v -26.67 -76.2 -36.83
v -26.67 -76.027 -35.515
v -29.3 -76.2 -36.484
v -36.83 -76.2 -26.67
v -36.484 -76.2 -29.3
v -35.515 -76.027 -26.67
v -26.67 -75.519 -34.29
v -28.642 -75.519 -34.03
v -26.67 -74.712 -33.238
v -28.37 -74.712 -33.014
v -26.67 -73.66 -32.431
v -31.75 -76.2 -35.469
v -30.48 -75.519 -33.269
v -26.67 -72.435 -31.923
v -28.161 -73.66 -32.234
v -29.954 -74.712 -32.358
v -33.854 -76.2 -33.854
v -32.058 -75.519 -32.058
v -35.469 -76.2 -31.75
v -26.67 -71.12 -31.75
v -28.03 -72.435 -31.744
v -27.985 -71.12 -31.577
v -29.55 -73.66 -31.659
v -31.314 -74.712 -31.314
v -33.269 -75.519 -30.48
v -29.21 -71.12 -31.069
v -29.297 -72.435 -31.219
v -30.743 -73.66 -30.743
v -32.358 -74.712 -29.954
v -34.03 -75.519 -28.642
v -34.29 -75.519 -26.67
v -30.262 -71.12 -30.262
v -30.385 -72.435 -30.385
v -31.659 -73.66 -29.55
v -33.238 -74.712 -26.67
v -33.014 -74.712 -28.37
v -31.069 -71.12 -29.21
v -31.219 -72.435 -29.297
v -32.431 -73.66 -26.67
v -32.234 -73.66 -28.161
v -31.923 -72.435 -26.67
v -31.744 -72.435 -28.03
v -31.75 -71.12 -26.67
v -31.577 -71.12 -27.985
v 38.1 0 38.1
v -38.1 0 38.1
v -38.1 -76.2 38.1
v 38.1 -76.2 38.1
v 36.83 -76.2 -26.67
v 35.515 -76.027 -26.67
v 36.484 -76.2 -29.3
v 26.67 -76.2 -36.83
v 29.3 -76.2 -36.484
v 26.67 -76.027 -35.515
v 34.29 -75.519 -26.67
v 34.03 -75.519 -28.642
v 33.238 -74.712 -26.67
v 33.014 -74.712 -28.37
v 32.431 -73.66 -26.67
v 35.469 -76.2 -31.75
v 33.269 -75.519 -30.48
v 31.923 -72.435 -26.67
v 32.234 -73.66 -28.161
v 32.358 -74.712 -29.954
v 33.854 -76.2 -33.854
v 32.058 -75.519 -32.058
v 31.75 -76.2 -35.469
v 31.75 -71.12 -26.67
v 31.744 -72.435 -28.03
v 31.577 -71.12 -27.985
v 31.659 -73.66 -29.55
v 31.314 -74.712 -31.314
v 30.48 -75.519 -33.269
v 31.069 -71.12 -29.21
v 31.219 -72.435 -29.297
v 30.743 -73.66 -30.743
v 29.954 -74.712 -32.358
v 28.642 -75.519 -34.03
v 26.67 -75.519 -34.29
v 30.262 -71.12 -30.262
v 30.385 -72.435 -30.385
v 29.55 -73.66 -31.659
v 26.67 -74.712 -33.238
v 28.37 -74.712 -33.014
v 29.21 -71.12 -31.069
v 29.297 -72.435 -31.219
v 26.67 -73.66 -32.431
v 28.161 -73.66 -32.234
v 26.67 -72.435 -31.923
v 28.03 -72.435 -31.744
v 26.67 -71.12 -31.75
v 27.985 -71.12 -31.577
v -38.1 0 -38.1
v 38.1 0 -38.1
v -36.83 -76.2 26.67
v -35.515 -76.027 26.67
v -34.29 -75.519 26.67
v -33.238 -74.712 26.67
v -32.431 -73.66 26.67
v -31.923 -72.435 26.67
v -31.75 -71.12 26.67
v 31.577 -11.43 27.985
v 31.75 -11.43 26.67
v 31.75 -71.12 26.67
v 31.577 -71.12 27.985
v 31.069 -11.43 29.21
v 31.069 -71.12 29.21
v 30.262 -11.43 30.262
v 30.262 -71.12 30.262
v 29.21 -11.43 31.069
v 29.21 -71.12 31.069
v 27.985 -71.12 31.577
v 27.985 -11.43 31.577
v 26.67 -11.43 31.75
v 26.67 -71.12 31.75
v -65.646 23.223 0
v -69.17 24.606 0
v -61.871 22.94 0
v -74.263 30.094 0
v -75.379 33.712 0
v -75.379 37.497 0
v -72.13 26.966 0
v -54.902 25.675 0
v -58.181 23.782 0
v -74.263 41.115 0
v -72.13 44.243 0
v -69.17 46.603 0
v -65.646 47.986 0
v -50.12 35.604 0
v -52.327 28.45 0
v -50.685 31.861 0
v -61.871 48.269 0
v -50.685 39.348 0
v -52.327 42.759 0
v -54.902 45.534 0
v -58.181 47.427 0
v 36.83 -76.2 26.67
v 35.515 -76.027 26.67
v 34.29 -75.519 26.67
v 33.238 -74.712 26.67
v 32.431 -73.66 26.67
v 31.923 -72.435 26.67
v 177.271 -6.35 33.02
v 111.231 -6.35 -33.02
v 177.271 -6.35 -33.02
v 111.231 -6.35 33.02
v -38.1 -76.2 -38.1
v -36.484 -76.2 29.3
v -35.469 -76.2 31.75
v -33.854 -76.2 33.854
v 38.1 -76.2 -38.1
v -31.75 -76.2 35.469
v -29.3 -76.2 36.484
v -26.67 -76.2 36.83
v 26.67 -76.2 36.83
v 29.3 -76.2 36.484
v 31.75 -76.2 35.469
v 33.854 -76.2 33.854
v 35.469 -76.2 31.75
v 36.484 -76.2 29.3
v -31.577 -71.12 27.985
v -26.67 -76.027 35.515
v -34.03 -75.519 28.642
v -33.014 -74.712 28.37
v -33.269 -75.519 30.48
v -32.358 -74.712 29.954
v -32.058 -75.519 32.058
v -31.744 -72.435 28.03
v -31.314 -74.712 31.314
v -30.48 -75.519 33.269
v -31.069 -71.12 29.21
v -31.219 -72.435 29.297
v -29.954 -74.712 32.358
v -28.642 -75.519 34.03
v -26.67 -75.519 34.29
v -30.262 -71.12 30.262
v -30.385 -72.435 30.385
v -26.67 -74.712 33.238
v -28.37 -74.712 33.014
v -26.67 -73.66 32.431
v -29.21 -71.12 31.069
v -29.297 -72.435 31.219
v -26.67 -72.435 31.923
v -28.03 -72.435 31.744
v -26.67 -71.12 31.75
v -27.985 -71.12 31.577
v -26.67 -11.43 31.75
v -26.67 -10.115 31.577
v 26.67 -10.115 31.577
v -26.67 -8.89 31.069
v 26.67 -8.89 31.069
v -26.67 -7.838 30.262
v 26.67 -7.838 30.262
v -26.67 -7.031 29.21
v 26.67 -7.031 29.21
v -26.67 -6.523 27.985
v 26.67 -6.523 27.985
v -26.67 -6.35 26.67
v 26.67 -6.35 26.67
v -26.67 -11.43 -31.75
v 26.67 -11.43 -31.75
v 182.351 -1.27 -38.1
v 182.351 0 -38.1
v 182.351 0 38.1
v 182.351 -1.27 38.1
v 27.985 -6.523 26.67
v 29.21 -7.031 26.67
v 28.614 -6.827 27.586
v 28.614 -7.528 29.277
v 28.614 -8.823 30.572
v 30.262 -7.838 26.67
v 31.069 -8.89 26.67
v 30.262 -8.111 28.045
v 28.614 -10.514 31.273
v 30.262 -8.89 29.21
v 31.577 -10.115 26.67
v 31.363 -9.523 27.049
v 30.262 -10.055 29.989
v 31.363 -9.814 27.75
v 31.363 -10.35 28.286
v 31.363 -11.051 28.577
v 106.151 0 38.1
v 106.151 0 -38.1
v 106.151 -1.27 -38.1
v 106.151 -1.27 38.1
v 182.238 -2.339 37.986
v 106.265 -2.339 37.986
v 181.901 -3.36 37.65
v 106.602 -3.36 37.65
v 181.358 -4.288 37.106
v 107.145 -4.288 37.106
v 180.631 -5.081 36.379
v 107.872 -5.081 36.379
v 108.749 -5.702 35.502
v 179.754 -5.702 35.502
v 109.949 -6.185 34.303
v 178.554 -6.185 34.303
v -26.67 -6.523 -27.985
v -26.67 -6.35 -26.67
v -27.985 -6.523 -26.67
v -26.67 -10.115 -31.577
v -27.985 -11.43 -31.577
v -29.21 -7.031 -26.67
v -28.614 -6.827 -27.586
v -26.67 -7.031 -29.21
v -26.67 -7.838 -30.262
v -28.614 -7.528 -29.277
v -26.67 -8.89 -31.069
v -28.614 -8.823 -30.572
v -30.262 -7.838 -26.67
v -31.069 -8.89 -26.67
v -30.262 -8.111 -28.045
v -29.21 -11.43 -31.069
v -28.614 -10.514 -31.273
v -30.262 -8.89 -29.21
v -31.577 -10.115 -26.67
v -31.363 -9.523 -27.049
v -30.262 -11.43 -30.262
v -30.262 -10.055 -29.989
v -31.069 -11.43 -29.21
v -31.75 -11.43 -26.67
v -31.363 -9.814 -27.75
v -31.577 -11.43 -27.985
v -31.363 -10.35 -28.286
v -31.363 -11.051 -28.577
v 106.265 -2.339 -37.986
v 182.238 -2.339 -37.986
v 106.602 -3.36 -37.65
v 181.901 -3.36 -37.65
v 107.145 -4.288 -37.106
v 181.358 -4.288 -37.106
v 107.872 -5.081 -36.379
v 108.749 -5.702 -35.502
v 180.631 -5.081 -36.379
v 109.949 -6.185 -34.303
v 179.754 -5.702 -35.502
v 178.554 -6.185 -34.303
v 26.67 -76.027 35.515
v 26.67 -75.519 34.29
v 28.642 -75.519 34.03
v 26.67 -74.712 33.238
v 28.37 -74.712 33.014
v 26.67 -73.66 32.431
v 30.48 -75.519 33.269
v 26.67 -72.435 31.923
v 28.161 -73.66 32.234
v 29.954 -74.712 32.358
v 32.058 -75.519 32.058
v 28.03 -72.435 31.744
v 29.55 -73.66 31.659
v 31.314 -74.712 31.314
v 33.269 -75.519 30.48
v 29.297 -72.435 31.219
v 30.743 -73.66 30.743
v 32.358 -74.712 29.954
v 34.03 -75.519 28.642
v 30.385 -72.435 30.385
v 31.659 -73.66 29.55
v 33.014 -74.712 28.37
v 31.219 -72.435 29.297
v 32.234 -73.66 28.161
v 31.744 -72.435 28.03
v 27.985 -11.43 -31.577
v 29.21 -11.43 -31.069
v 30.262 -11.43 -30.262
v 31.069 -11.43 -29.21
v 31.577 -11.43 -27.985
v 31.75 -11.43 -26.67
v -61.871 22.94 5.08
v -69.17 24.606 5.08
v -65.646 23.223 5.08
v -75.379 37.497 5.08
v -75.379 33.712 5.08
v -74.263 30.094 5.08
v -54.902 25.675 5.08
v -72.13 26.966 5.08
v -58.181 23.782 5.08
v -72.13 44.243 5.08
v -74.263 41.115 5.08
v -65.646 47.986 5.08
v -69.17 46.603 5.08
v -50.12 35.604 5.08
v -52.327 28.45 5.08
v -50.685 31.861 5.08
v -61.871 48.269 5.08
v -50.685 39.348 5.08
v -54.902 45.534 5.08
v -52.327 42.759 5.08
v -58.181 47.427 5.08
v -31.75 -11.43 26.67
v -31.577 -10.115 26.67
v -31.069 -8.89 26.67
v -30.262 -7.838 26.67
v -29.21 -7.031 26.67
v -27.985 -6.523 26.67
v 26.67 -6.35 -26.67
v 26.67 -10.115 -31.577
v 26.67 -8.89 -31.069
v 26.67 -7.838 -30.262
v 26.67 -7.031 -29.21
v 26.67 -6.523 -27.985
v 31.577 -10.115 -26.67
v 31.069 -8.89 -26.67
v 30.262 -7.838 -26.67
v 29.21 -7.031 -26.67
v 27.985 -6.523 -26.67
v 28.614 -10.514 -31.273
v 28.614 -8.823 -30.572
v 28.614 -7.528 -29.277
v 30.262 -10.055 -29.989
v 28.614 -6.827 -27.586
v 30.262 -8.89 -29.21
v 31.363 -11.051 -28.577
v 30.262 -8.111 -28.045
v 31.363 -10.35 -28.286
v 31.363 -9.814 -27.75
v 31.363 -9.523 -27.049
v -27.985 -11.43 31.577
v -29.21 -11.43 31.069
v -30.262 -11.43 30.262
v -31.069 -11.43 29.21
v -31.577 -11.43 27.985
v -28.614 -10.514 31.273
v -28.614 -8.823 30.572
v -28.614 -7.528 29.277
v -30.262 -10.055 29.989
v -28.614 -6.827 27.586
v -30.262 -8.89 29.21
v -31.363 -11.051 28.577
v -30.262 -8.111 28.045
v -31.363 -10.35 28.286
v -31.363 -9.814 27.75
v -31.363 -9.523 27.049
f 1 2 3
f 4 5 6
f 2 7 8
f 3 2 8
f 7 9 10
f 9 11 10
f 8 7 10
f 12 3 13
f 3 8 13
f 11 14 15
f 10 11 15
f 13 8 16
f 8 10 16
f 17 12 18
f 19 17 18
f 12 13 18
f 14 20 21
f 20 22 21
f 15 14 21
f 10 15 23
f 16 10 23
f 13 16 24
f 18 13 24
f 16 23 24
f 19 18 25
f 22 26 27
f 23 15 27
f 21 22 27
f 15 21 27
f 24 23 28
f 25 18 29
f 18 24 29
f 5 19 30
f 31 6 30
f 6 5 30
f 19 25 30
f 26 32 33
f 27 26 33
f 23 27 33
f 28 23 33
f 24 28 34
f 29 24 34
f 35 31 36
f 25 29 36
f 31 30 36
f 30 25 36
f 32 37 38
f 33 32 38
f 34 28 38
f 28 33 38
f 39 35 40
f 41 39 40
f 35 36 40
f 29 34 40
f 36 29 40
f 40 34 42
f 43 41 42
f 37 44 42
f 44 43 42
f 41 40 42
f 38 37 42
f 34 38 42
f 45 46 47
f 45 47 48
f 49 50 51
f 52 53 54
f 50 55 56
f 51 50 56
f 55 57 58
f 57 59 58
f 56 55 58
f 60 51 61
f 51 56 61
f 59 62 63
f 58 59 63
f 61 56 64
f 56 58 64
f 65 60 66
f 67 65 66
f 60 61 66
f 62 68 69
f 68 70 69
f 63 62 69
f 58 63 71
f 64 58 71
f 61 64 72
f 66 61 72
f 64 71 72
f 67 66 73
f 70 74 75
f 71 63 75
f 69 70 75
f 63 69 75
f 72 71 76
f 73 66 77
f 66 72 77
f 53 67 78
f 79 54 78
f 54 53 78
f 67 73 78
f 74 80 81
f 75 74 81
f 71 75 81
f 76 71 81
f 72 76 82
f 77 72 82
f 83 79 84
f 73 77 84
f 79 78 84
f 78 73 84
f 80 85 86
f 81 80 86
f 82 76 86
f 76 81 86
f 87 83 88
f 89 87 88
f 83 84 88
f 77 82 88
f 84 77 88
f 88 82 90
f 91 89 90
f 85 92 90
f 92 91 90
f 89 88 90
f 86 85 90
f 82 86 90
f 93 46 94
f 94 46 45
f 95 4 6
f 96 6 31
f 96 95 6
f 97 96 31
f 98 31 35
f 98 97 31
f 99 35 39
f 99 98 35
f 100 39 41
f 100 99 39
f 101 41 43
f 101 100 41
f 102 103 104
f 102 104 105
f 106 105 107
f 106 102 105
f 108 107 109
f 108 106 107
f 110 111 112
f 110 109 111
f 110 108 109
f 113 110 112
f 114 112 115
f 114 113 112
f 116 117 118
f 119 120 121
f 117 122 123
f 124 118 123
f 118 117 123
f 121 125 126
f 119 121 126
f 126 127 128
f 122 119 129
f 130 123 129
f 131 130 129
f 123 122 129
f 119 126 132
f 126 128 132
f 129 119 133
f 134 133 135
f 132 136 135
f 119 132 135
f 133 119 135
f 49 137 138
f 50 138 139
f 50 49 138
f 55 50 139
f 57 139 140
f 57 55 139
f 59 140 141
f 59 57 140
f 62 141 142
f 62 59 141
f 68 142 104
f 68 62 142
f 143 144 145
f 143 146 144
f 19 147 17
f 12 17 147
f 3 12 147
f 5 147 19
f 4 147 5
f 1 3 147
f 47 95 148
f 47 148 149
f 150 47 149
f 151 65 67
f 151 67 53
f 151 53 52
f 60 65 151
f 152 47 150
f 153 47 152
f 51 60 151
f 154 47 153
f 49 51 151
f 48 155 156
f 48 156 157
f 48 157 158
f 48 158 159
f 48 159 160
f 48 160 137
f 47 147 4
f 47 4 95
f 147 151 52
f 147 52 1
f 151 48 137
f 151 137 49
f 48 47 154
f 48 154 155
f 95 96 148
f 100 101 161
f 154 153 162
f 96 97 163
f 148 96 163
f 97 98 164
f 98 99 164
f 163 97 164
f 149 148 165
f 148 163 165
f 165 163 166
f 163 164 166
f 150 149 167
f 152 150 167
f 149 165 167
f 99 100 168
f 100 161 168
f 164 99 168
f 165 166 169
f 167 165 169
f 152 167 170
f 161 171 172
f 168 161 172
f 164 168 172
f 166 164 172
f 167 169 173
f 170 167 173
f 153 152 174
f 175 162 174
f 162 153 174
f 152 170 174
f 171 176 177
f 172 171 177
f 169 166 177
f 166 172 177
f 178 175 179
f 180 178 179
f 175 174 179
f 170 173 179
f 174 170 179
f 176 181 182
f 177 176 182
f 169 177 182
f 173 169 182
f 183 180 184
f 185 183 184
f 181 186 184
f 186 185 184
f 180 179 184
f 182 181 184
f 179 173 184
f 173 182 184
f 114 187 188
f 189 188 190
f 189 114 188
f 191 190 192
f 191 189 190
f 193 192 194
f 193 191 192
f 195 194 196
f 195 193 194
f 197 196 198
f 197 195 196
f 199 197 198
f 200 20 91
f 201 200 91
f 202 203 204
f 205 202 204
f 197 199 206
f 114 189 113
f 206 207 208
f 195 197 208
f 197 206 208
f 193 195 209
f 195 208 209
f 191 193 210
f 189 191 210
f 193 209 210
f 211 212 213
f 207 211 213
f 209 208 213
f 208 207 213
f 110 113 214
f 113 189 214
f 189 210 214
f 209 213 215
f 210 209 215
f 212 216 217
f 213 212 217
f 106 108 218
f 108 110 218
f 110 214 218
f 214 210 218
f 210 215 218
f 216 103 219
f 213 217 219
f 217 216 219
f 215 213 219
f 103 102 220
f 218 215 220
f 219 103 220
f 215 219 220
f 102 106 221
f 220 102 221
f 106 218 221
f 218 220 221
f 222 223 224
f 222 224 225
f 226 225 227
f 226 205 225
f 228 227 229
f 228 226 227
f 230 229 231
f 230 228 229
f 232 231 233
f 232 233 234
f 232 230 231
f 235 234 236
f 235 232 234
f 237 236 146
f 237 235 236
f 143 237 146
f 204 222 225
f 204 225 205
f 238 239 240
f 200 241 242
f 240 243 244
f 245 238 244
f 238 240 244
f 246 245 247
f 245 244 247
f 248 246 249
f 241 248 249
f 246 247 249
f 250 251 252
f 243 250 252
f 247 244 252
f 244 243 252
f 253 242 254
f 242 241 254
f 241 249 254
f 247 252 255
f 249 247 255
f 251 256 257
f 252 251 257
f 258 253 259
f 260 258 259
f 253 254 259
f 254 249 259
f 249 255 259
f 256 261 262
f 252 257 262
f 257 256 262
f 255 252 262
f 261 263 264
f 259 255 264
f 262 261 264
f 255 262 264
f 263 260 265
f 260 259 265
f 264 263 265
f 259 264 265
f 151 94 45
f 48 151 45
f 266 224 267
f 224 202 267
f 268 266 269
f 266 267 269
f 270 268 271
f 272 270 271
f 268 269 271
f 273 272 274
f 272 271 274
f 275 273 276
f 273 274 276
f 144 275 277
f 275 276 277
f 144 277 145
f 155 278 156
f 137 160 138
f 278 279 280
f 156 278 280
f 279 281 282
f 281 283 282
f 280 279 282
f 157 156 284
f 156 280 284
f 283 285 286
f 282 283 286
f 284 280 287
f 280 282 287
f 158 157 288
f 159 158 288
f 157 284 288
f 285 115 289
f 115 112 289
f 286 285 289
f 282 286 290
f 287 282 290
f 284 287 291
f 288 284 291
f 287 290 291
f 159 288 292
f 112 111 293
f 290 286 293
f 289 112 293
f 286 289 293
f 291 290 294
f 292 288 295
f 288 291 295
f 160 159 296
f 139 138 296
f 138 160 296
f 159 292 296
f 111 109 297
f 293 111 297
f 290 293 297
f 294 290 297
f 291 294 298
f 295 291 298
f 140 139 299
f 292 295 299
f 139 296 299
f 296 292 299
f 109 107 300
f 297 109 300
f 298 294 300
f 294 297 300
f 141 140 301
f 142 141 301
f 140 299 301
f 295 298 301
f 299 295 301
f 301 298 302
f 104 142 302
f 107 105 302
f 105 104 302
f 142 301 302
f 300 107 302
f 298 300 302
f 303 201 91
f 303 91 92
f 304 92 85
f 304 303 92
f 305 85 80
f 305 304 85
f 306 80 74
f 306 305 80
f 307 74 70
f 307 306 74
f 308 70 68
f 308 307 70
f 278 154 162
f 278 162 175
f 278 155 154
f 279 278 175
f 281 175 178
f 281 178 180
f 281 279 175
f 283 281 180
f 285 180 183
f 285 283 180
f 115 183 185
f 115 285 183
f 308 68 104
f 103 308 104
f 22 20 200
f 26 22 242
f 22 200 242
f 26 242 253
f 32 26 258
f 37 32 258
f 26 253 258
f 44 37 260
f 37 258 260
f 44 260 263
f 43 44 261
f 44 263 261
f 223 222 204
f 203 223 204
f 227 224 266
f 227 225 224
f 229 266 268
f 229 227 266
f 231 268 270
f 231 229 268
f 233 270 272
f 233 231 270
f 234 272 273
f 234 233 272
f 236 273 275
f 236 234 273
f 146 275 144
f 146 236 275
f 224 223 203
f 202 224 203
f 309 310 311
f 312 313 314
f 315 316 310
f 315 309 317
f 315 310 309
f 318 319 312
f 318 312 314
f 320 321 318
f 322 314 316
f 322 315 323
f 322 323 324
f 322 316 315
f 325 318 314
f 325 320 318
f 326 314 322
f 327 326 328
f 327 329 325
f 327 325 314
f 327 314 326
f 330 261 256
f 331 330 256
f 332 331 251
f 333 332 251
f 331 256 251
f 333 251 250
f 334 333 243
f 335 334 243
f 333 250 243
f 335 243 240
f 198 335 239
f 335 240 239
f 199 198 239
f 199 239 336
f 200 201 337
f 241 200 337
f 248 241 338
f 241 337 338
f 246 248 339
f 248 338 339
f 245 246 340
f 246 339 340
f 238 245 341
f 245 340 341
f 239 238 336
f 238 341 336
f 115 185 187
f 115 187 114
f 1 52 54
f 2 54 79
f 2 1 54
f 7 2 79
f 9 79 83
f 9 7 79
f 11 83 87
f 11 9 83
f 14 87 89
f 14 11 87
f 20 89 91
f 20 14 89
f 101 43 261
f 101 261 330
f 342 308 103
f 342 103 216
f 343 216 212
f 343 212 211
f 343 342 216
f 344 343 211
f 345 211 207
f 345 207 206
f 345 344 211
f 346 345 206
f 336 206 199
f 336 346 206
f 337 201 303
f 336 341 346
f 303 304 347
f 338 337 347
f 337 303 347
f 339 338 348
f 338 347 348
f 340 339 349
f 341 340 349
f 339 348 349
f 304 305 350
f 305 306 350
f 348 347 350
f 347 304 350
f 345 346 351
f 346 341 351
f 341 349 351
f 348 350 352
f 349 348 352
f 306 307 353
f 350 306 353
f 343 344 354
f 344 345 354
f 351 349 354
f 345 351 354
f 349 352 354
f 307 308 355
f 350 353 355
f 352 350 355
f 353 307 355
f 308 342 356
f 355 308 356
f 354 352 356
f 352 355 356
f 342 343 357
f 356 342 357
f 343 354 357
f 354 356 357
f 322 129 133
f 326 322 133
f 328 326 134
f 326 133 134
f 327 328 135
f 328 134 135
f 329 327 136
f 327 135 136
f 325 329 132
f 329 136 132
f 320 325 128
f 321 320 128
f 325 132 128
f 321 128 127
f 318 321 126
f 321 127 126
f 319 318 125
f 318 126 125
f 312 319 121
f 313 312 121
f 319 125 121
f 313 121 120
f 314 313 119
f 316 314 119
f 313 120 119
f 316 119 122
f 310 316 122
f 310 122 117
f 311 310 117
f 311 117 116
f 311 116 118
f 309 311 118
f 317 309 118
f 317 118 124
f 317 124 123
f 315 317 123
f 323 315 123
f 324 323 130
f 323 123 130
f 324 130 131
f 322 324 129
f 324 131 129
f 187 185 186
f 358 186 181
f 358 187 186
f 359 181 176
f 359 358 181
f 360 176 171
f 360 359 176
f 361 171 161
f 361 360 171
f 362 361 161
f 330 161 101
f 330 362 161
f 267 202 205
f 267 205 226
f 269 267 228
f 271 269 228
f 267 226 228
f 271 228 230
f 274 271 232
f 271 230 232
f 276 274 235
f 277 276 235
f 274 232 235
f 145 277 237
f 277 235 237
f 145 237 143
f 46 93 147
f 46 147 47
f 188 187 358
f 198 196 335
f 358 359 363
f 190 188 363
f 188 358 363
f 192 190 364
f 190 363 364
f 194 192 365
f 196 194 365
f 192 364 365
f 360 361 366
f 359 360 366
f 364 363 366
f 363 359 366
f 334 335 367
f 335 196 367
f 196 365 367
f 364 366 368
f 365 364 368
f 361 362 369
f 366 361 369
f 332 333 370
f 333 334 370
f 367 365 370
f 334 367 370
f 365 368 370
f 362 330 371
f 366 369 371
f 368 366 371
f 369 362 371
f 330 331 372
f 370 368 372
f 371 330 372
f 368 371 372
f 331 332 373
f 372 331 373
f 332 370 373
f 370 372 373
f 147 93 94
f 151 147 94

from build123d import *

# Parameters (mm, degrees)
F0_W         = 76.2
F0_H         = 76.2
F1_DEPTH     = 76.2
F2_W         = 63.5
F2_H         = 63.5
F3_DEPTH     = 69.85
F4_DEPTH     = 6.35
F5_R         = 5.08
F6_F1_R      = 5.08
F6_F2_R      = 5.08
F7_R         = 12.7
F8_DEPTH     = 5.08
F9_T1_DEPTH  = 53.34
F9_S5_W      = 5.08
F9_S5_H      = 5.08
F9_T6_DEPTH  = 5.08
F9_S11_W     = 5.08
F9_S11_H     = 5.08
F9_T12_DEPTH = 5.08
F9_S17_W     = 5.08
F9_S17_H     = 5.08
F9_T18_DEPTH = 5.08
F9_S23_W     = 5.08
F9_S23_H     = 5.08
F9_T24_DEPTH = 5.08


# Not quite as in the source:
# - a fillet or chamfer that OpenCascade refuses, or shapes differently, is made with other operations: its cross-section is extruded or revolved along the edge and cut away or added


with BuildPart() as f1:
    # F0 (on Front) → F1 (new body)
    with BuildSketch(Plane.XZ):
        Rectangle(F0_W, F0_H)
    extrude(amount=F1_DEPTH)

    # F2 (on face) → F3 (cut)
    with BuildSketch(Plane.XZ.offset(76.2)):
        Rectangle(F2_W, F2_H)
    extrude(amount=-F3_DEPTH, mode=Mode.SUBTRACT)

    # F6: fillet of radius 5.08 on 8 edges, made by hand

    # F6_f1
    f6_f1_edges = [f1.edges().sort_by_distance(p)[0] for p in [
        (31.75, -41.275, 31.75),
        (-31.75, -41.275, 31.75),
        (0, -6.35, 31.75),
        (-31.75, -41.275, -31.75),
        (31.75, -41.275, -31.75),
        (0, -6.35, -31.75),
    ]]
    fillet(f6_f1_edges, radius=F6_F1_R)

    # F6_f2
    f6_f2_edges = [f1.edges().sort_by_distance(p)[0] for p in [
        (0, -76.2, 31.75),
        (0, -76.2, -31.75),
        (-30.2621024484, -76.2, -30.2621024484),
        (30.2621024484, -76.2, -30.2621024484),
        (30.2621024484, -76.2, 30.2621024484),
        (-30.2621024484, -76.2, 30.2621024484),
    ]]
    fillet(f6_f2_edges, radius=F6_F2_R)

    # F9: fillet of radius 5.08 on 2 edges, made by hand

    # F9_s2 → F9_t1 (join)
    with BuildSketch(Plane.XY.offset(-26.67)):
        with BuildLine():
            ThreePointArc((-31.75, -11.43), (-30.2621024484, -7.8378975516), (-26.67, -6.35))
            Line((-26.67, -6.35), (-31.75, -6.35))
            Line((-31.75, -6.35), (-31.75, -11.43))
        make_face()
        with BuildLine():
            ThreePointArc((31.75, -11.43), (30.2621024484, -7.8378975516), (26.67, -6.35))
            Line((26.67, -6.35), (31.75, -6.35))
            Line((31.75, -6.35), (31.75, -11.43))
        make_face()
    extrude(amount=F9_T1_DEPTH)


with BuildPart() as f4:
    # F0 (on Front) → F4 (new body)
    with BuildSketch(Plane.XZ):
        with Locations((144.2514499441, 0)):
            Rectangle(F0_W, F0_H)
    extrude(amount=F4_DEPTH)

    # F5
    f5_edges = [f4.edges().sort_by_distance(p)[0] for p in [
        (144.25145, -6.35, -38.1),
        (182.35145, -6.35, 0),
        (144.25145, -6.35, 38.1),
        (106.15145, -6.35, 0),
    ]]
    fillet(f5_edges, radius=F5_R)


with BuildPart() as f8:
    # F7 (on Top) → F8 (new body)
    with BuildSketch(Plane.XY):
        with Locations((-62.8204271197, 35.6044583023)):
            Circle(F7_R)
    extrude(amount=F8_DEPTH)


with BuildPart() as f9_tool4:
    # F9_s5 → F9_t6 (new body)
    with BuildSketch(Plane.YZ.offset(26.67)):
        with Locations((-8.89, -29.21)):
            Rectangle(F9_S5_W, F9_S5_H)
    extrude(amount=F9_T6_DEPTH)

    # F9_s7 → F9_t8 (revolve, cut)
    with BuildSketch(Plane(origin=(26.67, -11.43, -26.67), x_dir=(0, -0.7071067812, 0.7071067812), z_dir=(0, 0.7071067812, 0.7071067812))):
        with BuildLine():
            ThreePointArc((0, -5.08), (5.08, 0), (0, 5.08))
            Line((0, 5.08), (0, -5.08))
        make_face()
    revolve(axis=Axis((26.67, -11.43, -26.67), (1, 0, 0)), mode=Mode.SUBTRACT)


with BuildPart() as f1_1:
    add(f1.part)

    # F9_t3: union F9_tool4
    add(f9_tool4.part)


with BuildPart() as f9_tool10:
    # F9_s11 → F9_t12 (new body)
    with BuildSketch(Plane.YZ.offset(26.67)):
        with Locations((-8.89, 29.21)):
            Rectangle(F9_S11_W, F9_S11_H)
    extrude(amount=F9_T12_DEPTH)

    # F9_s13 → F9_t14 (revolve, cut)
    with BuildSketch(Plane(origin=(26.67, -11.43, 26.67), x_dir=(0, -0.7071067812, -0.7071067812), z_dir=(0, -0.7071067812, 0.7071067812))):
        with BuildLine():
            ThreePointArc((0, -5.08), (5.08, 0), (0, 5.08))
            Line((0, 5.08), (0, -5.08))
        make_face()
    revolve(axis=Axis((26.67, -11.43, 26.67), (1, 0, 0)), mode=Mode.SUBTRACT)


with BuildPart() as f1_2:
    add(f1_1.part)

    # F9_t9: union F9_tool10
    add(f9_tool10.part)


with BuildPart() as f9_tool16:
    # F9_s17 → F9_t18 (new body)
    with BuildSketch(Plane.YZ.offset(-26.67)):
        with Locations((-8.89, 29.21)):
            Rectangle(F9_S17_W, F9_S17_H)
    extrude(amount=-F9_T18_DEPTH)

    # F9_s19 → F9_t20 (revolve, cut)
    with BuildSketch(Plane(origin=(-26.67, -11.43, 26.67), x_dir=(0, -0.7071067812, -0.7071067812), z_dir=(0, 0.7071067812, -0.7071067812))):
        with BuildLine():
            ThreePointArc((0, -5.08), (5.08, 0), (0, 5.08))
            Line((0, 5.08), (0, -5.08))
        make_face()
    revolve(axis=Axis((-26.67, -11.43, 26.67), (-1, 0, 0)), mode=Mode.SUBTRACT)


with BuildPart() as f1_3:
    add(f1_2.part)

    # F9_t15: union F9_tool16
    add(f9_tool16.part)


with BuildPart() as f9_tool22:
    # F9_s23 → F9_t24 (new body)
    with BuildSketch(Plane.YZ.offset(-26.67)):
        with Locations((-8.89, -29.21)):
            Rectangle(F9_S23_W, F9_S23_H)
    extrude(amount=-F9_T24_DEPTH)

    # F9_s25 → F9_t26 (revolve, cut)
    with BuildSketch(Plane(origin=(-26.67, -11.43, -26.67), x_dir=(0, -0.7071067812, 0.7071067812), z_dir=(0, -0.7071067812, -0.7071067812))):
        with BuildLine():
            ThreePointArc((0, -5.08), (5.08, 0), (0, 5.08))
            Line((0, 5.08), (0, -5.08))
        make_face()
    revolve(axis=Axis((-26.67, -11.43, -26.67), (-1, 0, 0)), mode=Mode.SUBTRACT)


with BuildPart() as f1_4:
    add(f1_3.part)

    # F9_t21: union F9_tool22
    add(f9_tool22.part)


solid = Compound([f4.part, f8.part, f1_4.part])
